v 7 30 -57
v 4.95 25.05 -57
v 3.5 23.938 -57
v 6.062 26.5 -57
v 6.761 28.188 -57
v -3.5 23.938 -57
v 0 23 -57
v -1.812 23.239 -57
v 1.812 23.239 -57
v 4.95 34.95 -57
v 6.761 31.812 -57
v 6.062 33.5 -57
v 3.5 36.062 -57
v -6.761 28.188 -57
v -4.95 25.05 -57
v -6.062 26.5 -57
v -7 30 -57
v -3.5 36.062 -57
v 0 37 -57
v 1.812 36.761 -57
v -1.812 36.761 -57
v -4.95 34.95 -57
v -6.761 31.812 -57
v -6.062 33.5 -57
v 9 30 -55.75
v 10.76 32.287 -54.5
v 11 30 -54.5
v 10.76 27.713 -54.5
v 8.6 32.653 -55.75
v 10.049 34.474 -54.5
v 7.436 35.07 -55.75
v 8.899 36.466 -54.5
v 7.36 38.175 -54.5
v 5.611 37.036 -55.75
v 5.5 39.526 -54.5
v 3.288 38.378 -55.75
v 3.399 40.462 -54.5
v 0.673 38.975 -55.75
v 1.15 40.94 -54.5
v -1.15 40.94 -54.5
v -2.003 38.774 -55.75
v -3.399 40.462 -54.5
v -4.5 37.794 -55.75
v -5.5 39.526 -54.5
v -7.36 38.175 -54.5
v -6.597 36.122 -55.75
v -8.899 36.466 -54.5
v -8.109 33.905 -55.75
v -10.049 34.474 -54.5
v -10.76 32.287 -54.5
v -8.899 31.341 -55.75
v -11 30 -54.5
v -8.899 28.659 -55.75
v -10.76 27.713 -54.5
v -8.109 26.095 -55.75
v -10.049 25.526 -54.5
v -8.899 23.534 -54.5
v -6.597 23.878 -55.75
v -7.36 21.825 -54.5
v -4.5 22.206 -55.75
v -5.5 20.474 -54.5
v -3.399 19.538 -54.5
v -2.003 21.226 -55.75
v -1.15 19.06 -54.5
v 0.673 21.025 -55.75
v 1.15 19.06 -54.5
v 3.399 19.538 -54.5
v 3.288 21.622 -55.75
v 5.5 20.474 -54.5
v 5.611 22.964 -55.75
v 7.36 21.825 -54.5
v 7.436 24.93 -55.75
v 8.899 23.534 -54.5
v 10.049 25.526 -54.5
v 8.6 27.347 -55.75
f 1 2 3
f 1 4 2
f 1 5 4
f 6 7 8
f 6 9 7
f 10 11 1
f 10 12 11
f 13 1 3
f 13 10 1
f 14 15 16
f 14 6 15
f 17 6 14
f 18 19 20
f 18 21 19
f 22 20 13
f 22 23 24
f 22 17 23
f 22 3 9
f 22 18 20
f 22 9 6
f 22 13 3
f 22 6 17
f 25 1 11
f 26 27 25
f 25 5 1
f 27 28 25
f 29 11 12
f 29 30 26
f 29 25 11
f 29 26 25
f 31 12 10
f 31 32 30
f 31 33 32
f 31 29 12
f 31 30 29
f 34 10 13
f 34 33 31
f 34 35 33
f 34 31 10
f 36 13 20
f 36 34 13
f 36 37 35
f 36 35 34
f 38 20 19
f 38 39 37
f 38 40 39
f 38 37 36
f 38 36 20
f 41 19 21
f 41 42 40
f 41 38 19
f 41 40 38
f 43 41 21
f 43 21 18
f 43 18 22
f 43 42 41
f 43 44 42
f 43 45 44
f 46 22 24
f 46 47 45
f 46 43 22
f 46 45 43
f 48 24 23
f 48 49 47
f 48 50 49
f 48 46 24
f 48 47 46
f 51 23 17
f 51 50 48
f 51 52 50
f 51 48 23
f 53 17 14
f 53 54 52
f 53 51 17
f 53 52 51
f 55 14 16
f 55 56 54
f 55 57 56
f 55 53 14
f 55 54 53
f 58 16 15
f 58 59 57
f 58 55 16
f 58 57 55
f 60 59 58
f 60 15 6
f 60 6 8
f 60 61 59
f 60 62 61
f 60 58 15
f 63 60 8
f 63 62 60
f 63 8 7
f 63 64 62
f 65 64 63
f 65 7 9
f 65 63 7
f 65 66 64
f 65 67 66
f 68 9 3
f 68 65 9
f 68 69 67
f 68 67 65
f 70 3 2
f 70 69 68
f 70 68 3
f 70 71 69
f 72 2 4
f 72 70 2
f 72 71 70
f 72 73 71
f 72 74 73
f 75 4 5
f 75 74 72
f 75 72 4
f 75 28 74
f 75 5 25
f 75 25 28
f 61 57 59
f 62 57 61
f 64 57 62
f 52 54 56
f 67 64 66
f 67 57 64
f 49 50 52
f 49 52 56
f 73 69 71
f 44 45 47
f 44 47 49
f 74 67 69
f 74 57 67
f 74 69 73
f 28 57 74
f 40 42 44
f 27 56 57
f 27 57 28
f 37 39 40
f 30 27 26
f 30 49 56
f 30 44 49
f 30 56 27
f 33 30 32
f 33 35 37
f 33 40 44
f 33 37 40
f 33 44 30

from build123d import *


with BuildPart() as cone_ul:
    # Cone → Cone (revolve)
    with BuildSketch(Plane(origin=(0, -30, 57), x_dir=(1, 0, 0), z_dir=(0, 1, 0))):
        Polygon((0, 0), (7, 0), (11, 2.5), (0, 2.5), align=None)
    revolve(axis=Axis((0, -30, 57), (0, 0, -1)))


with BuildPart() as cone_ur:
    # Part__Mirroring001: instance of Cone_UL
    add(cone_ul.part.mirror(Plane(origin=(0, 0, 0), x_dir=(1, 0, 0), z_dir=(0, 1, 0))))


with BuildPart() as cone_lr:
    # Part__Mirroring005: instance of Cone_UR
    add(cone_ur.part.mirror(Plane(origin=(0, 0, 0), x_dir=(0, 1, 0), z_dir=(0, 0, 1))))


solid = cone_lr.part
